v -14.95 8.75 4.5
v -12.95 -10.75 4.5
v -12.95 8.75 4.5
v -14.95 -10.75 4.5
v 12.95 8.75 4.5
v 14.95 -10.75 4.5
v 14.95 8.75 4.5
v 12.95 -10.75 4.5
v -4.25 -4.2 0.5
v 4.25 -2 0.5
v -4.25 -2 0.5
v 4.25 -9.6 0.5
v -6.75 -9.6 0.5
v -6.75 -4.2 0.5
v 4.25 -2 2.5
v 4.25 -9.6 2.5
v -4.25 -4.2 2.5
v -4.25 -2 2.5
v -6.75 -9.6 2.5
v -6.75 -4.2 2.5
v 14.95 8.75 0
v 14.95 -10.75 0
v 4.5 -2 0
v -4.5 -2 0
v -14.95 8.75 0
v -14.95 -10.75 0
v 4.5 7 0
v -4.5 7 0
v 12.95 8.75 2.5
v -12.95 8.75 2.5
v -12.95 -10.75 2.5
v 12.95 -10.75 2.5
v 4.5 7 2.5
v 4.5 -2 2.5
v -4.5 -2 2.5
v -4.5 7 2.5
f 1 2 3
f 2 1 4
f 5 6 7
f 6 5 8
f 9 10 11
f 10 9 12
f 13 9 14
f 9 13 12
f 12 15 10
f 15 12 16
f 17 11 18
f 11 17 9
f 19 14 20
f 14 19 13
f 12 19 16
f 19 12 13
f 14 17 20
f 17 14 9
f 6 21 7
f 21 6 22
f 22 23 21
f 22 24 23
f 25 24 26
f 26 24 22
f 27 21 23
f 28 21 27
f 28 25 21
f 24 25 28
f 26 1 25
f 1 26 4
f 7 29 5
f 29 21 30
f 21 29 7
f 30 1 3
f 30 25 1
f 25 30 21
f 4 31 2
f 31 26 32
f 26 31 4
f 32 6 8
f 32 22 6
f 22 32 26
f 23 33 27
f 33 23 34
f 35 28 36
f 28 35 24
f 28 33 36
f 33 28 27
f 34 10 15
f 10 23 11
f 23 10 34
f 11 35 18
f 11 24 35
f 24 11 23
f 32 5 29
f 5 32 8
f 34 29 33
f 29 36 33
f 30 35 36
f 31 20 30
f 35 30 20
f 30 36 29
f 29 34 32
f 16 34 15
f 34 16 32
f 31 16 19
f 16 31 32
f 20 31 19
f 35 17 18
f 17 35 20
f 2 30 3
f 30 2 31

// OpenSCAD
// this file just pulls out one module from picamera_2

use <./picamera_2.scad>

picamera_2_gripper();
